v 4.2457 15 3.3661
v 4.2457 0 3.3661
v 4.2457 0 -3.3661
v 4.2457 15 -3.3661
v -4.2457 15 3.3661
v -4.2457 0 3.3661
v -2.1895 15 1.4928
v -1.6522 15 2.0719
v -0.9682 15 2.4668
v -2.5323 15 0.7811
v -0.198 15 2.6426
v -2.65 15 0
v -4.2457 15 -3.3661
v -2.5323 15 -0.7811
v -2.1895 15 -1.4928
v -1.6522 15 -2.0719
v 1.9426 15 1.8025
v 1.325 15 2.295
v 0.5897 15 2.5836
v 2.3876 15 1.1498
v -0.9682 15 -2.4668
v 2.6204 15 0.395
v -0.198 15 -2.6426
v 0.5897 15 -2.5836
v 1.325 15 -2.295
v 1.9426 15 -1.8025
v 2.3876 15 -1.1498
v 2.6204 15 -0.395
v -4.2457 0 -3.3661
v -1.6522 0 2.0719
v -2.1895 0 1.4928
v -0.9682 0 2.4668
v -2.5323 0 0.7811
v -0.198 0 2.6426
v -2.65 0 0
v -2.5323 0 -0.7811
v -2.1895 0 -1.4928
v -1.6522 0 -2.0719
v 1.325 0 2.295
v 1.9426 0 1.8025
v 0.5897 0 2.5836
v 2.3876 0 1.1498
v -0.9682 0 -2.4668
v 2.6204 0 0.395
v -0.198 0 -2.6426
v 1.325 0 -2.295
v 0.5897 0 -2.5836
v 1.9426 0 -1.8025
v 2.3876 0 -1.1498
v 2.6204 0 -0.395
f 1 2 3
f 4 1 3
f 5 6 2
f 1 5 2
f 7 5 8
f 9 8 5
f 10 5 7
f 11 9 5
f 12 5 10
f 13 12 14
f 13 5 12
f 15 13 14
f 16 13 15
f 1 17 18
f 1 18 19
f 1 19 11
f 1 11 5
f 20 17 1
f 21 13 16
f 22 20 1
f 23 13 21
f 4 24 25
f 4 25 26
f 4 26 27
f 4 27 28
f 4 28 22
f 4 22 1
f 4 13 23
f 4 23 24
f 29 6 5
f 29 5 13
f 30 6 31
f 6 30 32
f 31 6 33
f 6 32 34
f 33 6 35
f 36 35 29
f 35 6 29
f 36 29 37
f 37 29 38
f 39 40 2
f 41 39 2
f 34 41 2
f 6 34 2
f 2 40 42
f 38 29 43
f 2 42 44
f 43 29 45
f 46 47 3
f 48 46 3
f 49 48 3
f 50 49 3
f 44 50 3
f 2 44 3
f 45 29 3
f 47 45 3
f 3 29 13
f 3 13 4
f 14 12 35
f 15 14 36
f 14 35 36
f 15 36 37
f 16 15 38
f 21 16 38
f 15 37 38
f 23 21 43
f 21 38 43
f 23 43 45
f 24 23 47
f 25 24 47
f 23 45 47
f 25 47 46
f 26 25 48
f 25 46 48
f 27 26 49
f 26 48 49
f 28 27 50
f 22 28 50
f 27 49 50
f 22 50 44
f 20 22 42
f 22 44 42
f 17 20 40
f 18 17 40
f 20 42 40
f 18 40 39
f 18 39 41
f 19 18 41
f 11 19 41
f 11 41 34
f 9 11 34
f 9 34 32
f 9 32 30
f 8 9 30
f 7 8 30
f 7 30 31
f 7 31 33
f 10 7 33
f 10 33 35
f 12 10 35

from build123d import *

# Parameters (mm, degrees)
SKETCH1_W                    = 8.491382686
SKETCH1_H                    = 6.732196236
SKETCH1_R                    = 2.5
BOSS_EXTRUDE1_DEPTH          = 15
TALADRO_DE_MARGEN_PARA_M51_D = 5.3


with BuildPart() as part:
    # Sketch1 → Boss-Extrude1 (new body)
    with BuildSketch(Plane(origin=(0, 0, 0), x_dir=(1, 0, 0), z_dir=(0, 1, 0))):
        Rectangle(SKETCH1_W, SKETCH1_H)
        with Locations(Location((0, 0, 0), (0, 0, 270))):
            Circle(SKETCH1_R, mode=Mode.SUBTRACT)
    extrude(amount=BOSS_EXTRUDE1_DEPTH)

    # Taladro de margen para M51 (through all)
    with Locations(Plane(origin=(0, 15, 0), x_dir=(1, 0, 0), z_dir=(0, 1, 0))):
        with Locations((0, 0)):
            Hole(TALADRO_DE_MARGEN_PARA_M51_D / 2)


solid = part.part
